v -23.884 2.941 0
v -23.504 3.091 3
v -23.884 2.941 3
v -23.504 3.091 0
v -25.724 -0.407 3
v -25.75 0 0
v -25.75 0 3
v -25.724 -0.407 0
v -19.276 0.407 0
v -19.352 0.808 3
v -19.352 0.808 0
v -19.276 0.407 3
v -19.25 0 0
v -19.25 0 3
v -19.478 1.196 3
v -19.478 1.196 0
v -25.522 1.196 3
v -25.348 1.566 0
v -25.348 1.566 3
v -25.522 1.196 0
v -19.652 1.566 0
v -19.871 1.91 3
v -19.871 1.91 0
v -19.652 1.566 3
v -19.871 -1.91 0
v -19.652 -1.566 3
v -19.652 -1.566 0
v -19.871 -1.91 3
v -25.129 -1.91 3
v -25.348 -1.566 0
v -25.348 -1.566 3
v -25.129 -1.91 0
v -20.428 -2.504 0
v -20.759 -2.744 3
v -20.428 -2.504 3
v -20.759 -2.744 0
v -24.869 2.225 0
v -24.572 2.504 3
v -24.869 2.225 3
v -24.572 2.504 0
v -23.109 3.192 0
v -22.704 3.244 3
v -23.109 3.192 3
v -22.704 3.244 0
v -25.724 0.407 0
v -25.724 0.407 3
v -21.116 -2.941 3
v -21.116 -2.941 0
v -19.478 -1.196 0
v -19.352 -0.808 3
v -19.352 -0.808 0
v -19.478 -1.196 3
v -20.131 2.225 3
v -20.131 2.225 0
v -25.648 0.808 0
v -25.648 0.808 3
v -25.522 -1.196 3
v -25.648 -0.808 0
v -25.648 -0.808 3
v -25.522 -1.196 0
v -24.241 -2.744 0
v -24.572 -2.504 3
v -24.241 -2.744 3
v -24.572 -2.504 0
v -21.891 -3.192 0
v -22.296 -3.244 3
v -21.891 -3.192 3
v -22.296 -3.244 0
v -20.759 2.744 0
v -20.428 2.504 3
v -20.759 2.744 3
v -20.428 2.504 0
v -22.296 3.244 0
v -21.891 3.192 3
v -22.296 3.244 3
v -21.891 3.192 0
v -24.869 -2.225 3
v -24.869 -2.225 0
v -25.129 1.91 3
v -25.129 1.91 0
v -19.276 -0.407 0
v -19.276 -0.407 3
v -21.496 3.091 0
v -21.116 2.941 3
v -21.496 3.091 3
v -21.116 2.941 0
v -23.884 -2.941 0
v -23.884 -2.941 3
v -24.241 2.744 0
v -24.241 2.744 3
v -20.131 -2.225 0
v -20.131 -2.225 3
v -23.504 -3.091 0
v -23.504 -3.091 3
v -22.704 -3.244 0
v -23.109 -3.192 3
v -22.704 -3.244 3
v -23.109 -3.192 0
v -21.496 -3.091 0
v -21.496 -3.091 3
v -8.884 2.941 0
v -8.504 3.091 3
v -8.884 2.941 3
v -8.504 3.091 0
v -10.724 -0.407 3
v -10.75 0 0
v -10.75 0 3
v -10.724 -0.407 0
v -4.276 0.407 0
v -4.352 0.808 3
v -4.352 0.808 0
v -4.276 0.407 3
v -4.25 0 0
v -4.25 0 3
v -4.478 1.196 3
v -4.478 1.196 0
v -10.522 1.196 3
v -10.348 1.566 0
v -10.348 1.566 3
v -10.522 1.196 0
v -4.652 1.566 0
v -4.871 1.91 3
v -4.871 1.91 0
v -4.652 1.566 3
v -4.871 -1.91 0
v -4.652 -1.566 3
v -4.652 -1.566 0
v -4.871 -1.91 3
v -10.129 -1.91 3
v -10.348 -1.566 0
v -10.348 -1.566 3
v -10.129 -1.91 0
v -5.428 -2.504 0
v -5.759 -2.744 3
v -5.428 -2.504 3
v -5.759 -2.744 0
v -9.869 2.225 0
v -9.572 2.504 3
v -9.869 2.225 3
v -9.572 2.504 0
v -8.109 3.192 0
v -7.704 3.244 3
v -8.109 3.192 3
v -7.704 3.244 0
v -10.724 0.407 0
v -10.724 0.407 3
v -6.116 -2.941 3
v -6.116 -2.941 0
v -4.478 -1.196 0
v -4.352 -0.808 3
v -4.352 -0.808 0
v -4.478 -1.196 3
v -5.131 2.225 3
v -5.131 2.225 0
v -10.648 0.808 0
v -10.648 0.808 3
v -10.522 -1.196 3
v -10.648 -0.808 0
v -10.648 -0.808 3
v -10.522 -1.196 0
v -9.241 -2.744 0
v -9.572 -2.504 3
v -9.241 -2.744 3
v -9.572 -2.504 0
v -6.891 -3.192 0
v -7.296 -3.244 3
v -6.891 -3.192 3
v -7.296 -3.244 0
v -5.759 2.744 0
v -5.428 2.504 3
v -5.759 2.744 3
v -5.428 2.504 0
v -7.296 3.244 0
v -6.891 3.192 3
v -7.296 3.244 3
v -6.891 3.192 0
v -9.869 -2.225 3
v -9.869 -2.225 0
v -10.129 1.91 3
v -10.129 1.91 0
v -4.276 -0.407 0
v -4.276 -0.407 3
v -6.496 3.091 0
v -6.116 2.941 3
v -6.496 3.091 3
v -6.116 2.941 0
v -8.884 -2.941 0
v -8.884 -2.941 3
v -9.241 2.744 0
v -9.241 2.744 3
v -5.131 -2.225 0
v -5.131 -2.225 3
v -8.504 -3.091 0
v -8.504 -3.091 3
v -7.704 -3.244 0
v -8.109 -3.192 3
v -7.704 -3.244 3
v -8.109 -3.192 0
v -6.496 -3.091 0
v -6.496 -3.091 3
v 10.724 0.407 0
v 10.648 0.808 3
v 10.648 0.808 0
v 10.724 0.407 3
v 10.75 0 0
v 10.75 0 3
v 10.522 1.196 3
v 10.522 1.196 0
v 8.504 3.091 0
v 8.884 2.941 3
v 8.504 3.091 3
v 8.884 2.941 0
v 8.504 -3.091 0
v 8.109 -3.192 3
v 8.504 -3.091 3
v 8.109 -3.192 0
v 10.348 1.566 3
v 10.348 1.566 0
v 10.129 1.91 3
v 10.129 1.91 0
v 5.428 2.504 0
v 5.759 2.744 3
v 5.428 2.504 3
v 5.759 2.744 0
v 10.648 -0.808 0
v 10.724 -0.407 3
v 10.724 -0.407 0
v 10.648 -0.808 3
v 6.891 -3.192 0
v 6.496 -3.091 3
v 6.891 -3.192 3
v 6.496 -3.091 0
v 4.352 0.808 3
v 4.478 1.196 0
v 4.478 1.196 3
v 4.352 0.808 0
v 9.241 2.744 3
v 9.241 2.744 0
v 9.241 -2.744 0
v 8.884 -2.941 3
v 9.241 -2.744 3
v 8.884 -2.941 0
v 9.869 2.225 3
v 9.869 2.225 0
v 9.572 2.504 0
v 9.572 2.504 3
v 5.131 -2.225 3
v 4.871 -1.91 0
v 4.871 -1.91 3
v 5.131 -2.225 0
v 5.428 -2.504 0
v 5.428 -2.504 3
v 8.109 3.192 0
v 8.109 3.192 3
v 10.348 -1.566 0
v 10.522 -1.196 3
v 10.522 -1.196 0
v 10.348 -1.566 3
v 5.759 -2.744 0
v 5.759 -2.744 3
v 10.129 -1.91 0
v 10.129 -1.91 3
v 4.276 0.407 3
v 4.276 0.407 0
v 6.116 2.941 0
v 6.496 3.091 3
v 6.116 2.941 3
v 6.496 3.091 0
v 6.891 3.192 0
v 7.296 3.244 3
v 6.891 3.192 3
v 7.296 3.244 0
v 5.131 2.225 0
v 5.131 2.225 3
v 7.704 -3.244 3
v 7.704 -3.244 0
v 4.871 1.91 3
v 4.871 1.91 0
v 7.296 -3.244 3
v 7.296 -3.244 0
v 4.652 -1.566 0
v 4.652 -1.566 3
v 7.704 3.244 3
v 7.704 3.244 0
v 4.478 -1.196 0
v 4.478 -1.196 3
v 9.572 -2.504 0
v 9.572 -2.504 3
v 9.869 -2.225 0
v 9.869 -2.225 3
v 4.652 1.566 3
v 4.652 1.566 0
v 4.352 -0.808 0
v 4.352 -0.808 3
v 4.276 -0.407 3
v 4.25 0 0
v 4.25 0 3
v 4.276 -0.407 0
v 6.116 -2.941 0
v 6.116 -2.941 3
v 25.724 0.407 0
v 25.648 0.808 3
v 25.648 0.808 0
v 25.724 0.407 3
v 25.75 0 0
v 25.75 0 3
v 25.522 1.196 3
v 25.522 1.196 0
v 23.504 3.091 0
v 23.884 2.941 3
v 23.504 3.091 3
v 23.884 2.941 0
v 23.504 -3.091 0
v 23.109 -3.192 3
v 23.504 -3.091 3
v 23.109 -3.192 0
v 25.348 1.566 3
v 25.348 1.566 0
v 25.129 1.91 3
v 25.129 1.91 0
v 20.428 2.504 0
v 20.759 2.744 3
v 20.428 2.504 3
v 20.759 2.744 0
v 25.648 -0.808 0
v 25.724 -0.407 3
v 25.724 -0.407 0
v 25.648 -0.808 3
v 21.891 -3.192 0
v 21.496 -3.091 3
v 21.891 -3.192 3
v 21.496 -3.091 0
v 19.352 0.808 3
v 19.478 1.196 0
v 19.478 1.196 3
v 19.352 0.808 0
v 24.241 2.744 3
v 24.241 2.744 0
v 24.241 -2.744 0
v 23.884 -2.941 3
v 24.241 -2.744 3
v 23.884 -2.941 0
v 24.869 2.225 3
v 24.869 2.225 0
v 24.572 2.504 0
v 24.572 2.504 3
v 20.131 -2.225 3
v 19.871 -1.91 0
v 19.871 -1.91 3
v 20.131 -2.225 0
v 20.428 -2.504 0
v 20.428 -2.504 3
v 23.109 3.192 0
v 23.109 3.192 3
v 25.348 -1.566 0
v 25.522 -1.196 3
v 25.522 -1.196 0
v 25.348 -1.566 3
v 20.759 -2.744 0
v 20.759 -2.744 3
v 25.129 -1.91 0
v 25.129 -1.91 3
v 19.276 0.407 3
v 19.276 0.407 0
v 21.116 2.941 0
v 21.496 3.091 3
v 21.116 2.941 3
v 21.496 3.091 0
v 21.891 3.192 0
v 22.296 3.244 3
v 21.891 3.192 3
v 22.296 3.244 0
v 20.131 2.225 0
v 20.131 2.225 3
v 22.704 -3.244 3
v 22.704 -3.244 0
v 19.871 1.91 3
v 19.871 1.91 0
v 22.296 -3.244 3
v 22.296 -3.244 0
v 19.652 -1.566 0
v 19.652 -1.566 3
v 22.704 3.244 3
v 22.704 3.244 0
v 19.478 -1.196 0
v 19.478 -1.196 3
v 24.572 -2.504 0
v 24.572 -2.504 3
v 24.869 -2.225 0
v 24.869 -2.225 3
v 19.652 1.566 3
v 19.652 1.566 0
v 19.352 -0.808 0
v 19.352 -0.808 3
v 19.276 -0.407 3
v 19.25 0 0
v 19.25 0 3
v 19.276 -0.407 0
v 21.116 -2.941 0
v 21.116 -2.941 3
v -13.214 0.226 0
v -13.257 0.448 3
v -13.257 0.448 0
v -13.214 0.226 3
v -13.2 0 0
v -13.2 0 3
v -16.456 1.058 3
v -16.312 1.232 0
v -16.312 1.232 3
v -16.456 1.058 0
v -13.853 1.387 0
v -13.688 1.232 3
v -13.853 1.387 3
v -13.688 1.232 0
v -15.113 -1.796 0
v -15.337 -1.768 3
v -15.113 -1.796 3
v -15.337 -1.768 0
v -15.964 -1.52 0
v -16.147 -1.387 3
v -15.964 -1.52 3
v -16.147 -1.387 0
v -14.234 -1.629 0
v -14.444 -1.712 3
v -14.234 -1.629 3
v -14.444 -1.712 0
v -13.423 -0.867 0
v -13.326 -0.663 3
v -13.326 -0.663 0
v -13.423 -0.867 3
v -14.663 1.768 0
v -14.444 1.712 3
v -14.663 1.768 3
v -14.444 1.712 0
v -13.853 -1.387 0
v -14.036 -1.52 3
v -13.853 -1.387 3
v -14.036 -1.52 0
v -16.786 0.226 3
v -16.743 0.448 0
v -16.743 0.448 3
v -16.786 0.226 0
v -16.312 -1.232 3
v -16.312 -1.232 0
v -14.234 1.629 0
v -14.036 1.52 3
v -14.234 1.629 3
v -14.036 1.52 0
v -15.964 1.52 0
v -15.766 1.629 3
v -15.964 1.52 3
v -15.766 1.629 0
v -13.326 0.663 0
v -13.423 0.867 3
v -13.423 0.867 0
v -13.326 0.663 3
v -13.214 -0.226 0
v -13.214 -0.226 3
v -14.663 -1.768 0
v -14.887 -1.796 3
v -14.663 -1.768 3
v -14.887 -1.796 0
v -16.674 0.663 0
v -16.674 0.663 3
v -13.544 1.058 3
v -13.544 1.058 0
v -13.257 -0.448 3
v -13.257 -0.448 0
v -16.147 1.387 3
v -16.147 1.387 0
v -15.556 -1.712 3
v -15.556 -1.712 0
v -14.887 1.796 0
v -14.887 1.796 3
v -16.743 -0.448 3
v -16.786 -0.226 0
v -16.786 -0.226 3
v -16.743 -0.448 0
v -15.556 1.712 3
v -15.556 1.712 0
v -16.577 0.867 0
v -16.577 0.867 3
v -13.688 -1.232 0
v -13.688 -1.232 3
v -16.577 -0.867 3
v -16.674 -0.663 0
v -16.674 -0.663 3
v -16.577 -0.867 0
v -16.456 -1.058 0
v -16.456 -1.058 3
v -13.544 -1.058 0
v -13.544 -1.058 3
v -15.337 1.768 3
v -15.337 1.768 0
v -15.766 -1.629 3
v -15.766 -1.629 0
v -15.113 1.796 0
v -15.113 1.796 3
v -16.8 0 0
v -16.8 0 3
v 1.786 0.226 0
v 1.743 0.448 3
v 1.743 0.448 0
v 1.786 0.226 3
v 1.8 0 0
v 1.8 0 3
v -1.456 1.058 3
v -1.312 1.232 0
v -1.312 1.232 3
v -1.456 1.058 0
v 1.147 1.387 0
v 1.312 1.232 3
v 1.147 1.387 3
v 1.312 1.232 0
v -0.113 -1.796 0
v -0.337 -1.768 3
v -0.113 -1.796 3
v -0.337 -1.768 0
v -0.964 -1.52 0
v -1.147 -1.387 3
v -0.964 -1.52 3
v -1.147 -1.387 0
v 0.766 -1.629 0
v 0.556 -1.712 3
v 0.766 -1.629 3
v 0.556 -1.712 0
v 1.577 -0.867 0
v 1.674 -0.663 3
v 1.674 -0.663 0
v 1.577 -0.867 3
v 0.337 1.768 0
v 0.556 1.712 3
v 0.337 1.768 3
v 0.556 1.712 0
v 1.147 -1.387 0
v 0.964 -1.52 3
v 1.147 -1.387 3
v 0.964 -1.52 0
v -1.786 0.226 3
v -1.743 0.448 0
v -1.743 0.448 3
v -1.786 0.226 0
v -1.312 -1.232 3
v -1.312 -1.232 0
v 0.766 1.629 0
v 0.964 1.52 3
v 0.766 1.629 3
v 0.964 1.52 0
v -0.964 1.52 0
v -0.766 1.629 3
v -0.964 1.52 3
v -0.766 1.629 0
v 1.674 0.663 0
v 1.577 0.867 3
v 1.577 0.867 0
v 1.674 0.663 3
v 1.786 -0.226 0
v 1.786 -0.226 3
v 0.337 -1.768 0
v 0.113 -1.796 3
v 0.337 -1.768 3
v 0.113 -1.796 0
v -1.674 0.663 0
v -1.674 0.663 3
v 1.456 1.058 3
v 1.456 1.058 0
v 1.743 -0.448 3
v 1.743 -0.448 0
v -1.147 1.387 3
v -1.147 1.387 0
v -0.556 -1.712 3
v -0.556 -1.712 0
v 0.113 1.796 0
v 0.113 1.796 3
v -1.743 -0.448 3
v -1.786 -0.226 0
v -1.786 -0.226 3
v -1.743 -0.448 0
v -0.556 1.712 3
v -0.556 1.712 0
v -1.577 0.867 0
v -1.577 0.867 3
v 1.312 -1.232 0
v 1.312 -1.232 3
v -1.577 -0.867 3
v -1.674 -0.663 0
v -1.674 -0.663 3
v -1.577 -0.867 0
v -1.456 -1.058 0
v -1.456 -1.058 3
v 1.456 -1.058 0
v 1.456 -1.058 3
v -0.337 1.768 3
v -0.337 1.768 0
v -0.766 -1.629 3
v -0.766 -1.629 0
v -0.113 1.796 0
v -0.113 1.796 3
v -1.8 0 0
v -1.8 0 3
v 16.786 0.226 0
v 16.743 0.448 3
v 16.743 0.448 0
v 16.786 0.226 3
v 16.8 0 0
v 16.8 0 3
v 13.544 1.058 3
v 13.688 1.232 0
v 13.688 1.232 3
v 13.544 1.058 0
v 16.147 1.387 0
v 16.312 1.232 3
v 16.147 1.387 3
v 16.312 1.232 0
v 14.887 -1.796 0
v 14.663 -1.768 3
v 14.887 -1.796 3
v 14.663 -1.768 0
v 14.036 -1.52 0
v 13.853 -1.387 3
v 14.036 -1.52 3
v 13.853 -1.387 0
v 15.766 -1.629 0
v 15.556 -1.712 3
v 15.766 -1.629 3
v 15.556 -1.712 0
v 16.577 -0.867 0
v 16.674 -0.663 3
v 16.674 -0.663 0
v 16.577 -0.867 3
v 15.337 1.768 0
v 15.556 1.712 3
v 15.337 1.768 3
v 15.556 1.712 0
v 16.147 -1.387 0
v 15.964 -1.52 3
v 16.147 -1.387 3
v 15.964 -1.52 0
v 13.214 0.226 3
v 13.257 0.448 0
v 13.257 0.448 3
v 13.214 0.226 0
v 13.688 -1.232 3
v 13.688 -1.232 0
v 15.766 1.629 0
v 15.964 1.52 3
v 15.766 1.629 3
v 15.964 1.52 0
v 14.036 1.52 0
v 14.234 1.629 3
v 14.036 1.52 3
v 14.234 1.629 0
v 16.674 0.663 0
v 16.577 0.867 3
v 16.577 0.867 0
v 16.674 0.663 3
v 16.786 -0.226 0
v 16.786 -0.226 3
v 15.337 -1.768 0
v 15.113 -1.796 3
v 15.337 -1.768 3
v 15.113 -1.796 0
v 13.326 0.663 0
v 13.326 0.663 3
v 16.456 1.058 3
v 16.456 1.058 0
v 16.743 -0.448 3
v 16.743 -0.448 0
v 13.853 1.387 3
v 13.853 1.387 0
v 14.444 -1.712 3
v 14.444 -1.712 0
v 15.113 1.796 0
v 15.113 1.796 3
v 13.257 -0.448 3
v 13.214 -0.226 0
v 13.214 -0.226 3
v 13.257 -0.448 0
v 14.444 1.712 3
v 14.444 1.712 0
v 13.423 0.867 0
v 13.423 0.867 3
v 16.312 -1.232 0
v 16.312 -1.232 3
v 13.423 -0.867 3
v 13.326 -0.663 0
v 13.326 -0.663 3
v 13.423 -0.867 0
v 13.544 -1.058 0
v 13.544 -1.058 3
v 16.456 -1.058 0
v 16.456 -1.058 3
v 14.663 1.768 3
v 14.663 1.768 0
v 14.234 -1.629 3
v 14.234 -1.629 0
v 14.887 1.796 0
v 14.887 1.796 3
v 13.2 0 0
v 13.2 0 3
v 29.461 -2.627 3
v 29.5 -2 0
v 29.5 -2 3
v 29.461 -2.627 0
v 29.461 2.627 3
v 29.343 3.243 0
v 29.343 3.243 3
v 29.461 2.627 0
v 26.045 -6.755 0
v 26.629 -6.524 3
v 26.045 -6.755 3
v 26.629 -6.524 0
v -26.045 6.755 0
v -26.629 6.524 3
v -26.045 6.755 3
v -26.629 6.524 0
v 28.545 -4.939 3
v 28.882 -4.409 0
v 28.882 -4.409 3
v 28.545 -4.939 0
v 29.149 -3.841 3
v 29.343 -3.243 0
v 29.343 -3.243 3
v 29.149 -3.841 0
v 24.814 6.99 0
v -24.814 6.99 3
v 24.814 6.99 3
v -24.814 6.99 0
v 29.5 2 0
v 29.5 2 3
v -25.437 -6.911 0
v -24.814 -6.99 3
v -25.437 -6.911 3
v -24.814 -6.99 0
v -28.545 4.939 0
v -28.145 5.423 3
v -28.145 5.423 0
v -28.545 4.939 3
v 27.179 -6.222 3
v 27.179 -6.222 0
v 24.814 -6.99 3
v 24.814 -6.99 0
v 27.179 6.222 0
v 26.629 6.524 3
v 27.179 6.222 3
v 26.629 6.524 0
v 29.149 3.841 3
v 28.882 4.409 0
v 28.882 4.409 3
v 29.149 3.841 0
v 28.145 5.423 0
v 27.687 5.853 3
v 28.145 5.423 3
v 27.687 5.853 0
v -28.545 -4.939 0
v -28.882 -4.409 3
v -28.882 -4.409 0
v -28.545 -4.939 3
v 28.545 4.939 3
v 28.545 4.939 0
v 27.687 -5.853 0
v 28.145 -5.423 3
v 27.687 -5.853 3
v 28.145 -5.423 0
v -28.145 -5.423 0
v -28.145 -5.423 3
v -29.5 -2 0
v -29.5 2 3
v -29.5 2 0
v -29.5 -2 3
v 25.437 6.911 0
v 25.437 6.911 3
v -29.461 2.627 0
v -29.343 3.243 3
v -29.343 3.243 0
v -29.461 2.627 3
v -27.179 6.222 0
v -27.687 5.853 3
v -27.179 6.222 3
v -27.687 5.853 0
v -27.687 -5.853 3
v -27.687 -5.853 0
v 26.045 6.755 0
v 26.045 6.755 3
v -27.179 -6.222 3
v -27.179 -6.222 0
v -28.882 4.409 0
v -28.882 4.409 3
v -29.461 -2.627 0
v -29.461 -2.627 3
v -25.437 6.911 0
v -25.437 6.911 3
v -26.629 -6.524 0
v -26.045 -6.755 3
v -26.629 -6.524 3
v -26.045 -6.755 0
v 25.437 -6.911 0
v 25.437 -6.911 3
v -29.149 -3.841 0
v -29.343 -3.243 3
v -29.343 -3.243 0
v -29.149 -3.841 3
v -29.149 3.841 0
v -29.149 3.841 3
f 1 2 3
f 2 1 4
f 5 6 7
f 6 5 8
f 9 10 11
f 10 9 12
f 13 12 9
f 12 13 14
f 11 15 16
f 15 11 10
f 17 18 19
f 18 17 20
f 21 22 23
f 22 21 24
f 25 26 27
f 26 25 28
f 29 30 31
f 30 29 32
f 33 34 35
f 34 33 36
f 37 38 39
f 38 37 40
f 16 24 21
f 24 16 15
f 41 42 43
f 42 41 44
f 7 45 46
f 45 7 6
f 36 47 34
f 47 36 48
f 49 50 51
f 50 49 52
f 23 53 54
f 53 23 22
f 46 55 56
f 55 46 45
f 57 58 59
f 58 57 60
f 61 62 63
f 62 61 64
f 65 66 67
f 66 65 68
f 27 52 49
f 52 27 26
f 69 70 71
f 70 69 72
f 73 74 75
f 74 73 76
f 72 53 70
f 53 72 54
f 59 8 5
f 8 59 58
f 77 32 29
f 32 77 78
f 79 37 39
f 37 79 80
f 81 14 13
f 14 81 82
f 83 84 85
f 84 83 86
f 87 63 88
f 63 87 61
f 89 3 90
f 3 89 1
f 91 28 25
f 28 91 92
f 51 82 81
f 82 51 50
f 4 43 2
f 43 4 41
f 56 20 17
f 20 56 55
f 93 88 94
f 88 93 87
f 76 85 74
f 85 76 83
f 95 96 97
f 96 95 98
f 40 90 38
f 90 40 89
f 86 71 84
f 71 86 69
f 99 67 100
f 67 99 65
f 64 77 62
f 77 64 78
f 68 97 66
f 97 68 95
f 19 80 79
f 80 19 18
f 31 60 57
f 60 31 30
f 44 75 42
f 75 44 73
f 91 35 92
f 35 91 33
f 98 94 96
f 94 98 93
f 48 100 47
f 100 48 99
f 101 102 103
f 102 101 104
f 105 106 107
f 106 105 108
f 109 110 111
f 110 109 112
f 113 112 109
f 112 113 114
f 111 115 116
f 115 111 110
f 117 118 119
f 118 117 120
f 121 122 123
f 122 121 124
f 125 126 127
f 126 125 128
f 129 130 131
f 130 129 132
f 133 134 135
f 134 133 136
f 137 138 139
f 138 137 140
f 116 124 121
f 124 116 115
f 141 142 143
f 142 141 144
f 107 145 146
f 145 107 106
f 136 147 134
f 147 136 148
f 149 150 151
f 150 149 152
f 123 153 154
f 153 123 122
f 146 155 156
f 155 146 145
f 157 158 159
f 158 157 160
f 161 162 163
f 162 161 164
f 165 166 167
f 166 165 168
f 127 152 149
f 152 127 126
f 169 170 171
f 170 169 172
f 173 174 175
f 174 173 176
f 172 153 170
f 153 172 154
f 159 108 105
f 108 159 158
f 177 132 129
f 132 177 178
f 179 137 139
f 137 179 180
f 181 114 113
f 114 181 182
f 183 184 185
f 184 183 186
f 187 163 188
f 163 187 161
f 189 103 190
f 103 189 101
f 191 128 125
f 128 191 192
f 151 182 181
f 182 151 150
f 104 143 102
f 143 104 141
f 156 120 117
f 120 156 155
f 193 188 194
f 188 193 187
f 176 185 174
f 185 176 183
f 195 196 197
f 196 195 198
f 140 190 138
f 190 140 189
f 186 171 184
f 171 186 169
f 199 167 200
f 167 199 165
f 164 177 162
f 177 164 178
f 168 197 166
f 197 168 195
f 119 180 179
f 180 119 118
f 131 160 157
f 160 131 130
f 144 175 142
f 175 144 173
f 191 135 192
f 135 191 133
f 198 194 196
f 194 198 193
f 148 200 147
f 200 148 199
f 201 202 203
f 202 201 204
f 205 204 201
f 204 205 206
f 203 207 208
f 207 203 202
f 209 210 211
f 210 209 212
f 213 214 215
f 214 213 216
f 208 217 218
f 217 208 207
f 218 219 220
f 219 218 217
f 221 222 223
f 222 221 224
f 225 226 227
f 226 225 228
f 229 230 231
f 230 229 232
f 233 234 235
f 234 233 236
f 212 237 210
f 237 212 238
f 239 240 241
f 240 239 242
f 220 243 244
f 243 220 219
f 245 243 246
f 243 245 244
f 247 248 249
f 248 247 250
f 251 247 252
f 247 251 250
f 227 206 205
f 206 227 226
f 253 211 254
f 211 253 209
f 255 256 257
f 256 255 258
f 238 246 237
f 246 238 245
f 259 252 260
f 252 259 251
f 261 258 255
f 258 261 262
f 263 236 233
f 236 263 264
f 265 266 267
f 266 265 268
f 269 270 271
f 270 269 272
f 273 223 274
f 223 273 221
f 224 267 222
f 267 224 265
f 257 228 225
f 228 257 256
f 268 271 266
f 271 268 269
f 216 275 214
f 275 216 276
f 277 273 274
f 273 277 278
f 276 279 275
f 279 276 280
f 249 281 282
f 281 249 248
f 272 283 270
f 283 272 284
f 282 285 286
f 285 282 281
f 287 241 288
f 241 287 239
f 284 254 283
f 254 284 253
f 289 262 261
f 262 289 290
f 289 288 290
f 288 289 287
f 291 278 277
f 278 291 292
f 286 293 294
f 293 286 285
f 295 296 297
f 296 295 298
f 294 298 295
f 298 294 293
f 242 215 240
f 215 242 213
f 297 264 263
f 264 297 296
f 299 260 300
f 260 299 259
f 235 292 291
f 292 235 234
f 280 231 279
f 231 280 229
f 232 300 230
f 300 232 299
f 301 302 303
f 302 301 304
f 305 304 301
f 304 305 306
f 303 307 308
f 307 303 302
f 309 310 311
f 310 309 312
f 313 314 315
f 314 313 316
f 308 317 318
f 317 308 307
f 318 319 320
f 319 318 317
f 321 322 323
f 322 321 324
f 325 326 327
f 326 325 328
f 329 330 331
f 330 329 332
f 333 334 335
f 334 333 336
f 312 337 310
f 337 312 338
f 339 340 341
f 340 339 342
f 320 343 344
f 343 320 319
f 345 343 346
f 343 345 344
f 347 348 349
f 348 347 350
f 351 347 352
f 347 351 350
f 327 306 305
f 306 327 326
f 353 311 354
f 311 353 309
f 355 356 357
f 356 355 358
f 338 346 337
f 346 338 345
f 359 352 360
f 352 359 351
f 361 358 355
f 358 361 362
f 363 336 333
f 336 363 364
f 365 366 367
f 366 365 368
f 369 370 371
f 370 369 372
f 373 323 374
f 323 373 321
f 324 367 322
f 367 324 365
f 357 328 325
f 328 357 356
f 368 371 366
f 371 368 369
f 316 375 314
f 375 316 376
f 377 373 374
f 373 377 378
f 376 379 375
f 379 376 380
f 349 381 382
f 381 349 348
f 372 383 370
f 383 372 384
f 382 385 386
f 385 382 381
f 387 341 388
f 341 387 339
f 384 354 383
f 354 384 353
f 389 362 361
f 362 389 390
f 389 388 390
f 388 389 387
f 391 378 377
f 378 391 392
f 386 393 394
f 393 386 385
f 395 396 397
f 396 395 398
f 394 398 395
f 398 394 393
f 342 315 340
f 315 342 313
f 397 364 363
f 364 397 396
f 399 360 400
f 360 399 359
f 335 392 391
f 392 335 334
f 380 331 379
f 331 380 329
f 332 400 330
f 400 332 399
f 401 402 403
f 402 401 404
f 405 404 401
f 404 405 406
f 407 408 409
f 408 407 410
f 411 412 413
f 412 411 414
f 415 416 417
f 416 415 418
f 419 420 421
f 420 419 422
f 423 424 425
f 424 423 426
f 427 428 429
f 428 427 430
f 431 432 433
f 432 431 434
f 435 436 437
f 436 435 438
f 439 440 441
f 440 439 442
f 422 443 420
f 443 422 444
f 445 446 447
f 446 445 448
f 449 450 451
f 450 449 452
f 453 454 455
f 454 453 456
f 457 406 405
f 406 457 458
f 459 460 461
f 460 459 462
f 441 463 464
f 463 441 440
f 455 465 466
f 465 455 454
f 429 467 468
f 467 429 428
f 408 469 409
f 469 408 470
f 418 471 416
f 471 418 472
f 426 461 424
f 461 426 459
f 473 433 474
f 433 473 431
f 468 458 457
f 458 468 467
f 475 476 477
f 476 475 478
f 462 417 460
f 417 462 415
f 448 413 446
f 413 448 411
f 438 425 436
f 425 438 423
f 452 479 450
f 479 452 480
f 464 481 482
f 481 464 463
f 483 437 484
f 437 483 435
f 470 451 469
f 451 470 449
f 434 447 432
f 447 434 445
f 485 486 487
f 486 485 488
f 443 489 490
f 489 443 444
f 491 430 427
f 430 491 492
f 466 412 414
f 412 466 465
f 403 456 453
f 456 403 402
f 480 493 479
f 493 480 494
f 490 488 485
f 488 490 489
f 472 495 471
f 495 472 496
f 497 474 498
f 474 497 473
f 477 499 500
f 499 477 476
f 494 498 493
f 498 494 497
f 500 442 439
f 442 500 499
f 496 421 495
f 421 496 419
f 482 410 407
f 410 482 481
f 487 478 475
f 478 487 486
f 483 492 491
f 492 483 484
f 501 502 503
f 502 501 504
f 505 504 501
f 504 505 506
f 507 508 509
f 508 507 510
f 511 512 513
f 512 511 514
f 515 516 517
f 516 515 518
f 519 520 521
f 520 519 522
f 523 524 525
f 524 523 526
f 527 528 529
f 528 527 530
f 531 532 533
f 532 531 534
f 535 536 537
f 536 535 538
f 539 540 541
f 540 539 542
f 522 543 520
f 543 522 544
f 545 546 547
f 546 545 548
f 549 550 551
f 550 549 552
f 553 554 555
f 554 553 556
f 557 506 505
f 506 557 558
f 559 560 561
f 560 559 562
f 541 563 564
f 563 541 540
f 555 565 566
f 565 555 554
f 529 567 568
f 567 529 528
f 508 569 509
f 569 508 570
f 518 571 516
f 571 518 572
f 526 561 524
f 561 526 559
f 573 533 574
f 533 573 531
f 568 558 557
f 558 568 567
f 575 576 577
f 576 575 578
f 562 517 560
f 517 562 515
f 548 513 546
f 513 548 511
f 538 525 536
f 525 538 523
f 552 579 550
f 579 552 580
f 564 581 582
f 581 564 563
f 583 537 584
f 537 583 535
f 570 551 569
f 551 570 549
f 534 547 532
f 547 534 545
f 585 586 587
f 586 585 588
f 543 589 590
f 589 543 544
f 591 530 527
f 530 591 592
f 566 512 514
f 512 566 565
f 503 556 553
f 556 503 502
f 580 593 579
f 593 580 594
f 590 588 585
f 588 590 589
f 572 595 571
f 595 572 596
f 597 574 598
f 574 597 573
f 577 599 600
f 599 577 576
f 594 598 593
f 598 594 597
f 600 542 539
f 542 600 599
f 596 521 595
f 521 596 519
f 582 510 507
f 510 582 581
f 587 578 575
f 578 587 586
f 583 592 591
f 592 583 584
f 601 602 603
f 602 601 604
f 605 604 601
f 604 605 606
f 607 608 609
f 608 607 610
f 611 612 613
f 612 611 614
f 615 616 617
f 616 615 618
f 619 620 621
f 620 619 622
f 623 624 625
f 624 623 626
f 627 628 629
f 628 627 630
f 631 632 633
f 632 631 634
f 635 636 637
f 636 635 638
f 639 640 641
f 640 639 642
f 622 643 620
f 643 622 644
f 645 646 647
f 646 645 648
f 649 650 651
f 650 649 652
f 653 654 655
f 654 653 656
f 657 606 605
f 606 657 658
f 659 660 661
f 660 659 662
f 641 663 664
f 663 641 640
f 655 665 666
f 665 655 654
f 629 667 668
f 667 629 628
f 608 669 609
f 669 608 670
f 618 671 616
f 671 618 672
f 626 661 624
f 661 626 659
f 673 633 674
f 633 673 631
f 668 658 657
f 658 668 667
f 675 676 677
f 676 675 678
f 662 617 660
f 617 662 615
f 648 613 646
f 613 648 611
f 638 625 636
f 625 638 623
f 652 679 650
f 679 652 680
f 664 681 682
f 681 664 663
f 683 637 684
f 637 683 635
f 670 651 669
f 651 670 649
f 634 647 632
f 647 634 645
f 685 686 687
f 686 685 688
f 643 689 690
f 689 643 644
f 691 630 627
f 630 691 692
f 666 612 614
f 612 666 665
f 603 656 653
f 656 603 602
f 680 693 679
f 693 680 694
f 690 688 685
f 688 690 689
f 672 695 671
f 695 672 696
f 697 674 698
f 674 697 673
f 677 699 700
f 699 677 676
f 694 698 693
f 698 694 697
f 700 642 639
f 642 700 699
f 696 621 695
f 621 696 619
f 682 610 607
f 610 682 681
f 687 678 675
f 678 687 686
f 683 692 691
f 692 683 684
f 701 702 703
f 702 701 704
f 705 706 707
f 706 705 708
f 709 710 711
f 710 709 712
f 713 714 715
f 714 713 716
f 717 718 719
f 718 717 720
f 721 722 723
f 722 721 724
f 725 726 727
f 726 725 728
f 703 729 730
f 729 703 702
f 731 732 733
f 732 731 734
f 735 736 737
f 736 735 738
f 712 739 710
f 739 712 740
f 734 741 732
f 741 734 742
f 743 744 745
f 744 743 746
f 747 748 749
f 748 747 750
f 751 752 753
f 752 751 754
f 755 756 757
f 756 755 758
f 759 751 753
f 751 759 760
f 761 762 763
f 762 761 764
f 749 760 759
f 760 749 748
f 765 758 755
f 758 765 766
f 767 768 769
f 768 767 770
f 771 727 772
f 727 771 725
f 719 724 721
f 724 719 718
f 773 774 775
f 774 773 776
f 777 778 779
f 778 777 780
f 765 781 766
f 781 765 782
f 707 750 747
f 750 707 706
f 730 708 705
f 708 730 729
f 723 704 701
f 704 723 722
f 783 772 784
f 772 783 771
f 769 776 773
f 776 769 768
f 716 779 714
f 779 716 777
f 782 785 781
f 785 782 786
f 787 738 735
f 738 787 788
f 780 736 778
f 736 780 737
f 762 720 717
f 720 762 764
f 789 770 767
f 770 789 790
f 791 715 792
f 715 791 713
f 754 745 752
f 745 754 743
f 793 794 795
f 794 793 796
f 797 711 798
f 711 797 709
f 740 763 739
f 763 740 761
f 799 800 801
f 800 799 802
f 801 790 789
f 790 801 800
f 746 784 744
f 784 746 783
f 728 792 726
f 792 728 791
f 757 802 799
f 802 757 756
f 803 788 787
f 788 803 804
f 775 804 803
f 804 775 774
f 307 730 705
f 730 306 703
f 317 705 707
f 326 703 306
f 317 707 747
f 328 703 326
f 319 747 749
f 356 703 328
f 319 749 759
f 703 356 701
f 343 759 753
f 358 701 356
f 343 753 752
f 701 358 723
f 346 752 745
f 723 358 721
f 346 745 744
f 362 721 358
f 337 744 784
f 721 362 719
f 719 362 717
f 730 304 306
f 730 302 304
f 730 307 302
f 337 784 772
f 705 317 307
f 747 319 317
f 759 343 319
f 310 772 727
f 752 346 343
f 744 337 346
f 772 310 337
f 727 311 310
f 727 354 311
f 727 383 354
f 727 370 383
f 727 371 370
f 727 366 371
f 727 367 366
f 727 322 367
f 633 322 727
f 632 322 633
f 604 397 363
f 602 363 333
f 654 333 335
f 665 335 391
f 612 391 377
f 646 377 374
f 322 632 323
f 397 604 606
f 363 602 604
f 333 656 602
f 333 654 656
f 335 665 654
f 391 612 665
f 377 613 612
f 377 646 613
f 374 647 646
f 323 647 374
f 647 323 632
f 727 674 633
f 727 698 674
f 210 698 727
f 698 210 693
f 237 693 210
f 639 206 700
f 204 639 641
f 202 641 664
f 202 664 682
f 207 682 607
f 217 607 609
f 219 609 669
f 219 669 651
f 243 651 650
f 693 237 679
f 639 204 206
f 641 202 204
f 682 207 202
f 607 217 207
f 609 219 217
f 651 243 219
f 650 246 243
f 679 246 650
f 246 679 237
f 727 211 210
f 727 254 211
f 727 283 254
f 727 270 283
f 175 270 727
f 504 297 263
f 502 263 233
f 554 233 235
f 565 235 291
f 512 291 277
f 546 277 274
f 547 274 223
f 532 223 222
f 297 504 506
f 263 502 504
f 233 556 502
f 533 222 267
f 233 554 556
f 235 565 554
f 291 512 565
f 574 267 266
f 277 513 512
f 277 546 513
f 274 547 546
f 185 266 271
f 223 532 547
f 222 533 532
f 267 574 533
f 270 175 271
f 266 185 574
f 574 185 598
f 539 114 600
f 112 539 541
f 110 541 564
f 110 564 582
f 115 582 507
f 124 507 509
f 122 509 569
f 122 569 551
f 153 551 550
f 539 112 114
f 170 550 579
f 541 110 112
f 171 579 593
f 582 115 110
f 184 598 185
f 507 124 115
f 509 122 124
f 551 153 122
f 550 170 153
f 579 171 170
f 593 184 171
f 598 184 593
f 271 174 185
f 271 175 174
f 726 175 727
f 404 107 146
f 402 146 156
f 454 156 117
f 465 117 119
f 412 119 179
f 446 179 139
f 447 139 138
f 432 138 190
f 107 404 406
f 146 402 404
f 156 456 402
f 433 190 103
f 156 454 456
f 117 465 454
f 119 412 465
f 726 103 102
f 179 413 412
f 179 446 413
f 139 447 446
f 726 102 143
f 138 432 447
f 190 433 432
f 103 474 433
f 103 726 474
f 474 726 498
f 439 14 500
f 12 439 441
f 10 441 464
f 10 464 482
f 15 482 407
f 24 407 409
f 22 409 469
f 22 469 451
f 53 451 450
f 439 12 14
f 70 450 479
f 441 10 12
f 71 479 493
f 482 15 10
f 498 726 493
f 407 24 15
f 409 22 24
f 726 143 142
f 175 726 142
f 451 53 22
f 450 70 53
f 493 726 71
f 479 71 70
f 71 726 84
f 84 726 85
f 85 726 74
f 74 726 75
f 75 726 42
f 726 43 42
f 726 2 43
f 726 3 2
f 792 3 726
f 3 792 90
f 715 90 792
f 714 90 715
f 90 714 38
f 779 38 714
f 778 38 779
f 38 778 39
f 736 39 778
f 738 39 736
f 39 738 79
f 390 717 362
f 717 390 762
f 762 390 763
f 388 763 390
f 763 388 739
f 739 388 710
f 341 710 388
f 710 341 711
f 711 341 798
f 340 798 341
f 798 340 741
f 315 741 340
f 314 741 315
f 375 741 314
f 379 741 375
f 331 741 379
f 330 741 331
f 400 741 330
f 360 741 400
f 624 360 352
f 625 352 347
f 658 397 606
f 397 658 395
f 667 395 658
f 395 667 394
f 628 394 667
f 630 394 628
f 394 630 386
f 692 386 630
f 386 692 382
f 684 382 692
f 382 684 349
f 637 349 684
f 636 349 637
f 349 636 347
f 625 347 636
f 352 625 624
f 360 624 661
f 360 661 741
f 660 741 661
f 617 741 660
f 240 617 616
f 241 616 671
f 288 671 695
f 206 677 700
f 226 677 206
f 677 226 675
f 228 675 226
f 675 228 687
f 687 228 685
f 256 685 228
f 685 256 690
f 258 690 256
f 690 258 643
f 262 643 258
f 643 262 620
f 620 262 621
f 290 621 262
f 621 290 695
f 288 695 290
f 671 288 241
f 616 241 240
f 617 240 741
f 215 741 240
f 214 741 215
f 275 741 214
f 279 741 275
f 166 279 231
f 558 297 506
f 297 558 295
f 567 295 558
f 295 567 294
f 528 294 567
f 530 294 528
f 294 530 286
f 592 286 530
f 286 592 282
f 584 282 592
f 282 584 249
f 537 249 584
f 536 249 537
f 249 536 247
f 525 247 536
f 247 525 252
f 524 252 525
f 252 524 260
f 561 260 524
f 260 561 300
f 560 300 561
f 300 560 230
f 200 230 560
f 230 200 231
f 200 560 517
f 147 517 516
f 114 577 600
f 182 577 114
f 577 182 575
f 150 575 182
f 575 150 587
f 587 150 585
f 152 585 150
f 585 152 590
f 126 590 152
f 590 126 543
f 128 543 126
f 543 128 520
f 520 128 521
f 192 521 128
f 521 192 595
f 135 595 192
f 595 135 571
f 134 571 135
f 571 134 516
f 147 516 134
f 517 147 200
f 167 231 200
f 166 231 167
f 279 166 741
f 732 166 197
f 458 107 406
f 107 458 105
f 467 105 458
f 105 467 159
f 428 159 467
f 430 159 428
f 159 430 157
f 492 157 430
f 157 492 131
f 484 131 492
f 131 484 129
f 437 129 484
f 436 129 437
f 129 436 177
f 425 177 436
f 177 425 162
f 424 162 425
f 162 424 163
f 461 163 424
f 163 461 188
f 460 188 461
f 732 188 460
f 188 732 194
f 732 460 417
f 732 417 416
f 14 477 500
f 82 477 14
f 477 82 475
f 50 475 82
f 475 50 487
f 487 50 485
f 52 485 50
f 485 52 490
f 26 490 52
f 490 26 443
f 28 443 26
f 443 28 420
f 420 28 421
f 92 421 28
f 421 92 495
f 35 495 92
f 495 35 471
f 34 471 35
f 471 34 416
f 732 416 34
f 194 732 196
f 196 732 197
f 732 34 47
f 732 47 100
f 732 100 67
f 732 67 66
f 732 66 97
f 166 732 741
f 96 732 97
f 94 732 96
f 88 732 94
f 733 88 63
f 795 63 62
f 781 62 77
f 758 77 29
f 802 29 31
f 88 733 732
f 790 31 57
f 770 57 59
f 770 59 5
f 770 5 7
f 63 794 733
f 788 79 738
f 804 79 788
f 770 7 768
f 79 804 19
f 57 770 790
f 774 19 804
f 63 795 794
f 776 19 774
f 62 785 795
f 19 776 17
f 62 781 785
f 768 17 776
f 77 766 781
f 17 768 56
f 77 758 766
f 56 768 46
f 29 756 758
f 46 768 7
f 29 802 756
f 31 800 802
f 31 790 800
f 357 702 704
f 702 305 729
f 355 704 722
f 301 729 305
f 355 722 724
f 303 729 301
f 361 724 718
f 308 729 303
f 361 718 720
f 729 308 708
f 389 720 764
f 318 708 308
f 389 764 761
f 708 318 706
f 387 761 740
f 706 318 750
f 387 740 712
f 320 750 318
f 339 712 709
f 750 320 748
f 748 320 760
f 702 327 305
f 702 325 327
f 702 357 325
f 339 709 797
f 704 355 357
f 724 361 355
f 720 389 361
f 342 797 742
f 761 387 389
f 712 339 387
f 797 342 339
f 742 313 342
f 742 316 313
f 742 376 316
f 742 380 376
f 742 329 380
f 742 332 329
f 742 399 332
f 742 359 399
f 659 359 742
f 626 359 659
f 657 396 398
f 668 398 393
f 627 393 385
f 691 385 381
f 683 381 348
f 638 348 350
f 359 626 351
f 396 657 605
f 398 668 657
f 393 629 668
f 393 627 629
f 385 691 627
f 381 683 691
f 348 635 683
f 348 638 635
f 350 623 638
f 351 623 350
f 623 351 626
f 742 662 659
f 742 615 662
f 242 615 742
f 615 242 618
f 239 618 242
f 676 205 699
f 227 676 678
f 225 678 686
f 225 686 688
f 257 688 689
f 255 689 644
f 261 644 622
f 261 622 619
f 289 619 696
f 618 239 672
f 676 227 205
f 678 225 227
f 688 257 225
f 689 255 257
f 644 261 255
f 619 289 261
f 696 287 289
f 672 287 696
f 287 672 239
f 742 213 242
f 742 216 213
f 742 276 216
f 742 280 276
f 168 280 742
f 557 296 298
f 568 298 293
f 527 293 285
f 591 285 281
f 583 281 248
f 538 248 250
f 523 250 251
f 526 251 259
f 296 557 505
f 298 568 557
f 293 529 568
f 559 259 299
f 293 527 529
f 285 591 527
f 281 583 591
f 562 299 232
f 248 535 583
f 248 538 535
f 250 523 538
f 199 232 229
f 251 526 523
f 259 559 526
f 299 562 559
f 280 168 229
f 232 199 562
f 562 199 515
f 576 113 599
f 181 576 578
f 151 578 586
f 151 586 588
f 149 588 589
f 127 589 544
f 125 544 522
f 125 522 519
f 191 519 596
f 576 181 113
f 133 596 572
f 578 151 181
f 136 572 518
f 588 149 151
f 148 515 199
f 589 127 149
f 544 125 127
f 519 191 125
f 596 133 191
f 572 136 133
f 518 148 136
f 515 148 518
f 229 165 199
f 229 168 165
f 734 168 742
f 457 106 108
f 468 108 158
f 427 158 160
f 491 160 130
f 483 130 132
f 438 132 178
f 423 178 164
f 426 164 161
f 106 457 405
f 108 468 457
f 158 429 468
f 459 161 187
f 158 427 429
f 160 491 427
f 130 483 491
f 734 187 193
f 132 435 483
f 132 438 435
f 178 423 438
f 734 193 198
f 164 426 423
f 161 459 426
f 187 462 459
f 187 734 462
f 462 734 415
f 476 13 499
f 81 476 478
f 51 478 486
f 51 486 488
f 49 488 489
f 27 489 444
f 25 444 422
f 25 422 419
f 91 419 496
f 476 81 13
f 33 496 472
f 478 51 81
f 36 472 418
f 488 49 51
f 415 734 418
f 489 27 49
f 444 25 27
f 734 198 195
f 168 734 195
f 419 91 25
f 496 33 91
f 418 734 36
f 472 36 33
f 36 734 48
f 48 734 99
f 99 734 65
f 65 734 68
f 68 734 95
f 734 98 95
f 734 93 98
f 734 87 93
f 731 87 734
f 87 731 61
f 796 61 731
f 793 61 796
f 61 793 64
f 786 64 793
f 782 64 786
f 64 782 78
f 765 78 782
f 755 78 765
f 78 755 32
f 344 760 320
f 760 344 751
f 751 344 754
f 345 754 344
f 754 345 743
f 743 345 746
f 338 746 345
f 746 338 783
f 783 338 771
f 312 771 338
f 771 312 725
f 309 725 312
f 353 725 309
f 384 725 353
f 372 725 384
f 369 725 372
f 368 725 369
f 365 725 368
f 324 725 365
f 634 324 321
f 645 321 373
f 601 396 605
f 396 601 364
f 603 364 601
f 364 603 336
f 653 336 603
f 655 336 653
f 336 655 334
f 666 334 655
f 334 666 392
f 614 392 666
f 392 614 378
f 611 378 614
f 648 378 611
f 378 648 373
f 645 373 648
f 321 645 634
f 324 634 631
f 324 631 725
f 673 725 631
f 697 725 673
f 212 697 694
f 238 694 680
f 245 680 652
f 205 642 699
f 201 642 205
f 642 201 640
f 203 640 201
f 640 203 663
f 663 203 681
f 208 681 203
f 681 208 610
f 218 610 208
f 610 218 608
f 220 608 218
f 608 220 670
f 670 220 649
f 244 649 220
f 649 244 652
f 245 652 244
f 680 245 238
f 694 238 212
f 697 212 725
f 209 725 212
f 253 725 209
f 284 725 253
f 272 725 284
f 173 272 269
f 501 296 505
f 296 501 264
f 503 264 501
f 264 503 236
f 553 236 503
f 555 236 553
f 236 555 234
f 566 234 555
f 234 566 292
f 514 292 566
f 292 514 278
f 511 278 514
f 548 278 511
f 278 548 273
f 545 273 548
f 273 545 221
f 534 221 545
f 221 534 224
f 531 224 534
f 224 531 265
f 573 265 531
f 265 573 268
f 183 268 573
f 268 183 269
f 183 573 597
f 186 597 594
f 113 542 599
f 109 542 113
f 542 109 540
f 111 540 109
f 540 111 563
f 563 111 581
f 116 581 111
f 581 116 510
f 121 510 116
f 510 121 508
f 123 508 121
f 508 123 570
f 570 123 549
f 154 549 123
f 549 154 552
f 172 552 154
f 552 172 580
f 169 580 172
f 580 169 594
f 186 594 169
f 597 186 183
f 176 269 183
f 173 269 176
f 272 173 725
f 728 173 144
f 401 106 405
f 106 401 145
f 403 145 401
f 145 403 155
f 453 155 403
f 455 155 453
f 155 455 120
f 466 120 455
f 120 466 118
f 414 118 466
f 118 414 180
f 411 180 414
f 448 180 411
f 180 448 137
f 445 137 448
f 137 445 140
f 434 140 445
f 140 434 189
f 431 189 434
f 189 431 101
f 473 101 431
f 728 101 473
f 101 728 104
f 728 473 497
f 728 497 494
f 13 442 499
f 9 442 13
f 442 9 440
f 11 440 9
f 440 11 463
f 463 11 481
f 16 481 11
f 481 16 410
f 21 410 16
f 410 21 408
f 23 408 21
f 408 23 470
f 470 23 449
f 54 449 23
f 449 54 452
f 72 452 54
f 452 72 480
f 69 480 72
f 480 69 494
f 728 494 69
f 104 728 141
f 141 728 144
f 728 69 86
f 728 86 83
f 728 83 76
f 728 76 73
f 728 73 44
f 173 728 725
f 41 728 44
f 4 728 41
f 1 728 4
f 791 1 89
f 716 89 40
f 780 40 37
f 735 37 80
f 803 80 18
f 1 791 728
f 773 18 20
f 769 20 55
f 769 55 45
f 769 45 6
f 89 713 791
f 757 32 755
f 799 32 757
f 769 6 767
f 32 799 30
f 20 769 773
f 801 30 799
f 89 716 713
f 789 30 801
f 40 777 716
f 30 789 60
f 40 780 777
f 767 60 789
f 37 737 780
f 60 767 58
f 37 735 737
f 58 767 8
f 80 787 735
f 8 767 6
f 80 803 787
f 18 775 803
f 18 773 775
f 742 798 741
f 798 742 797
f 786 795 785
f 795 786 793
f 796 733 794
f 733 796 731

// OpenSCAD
$fn = 50;

difference() {
	union() {
		hull() {
			translate(v = [-24.5, 2.0, 0]) {
				cylinder(h = 3, r = 5);
			}
			translate(v = [24.5, 2.0, 0]) {
				cylinder(h = 3, r = 5);
			}
			translate(v = [-24.5, -2.0, 0]) {
				cylinder(h = 3, r = 5);
			}
			translate(v = [24.5, -2.0, 0]) {
				cylinder(h = 3, r = 5);
			}
		}
	}
	union() {
		translate(v = [-22.5, 0.0, 0]) {
			translate(v = [0, 0, -100]) {
				cylinder(h = 200, r = 3.25);
			}
		}
		translate(v = [-7.5, 0.0, 0]) {
			translate(v = [0, 0, -100]) {
				cylinder(h = 200, r = 3.25);
			}
		}
		translate(v = [7.5, 0.0, 0]) {
			translate(v = [0, 0, -100]) {
				cylinder(h = 200, r = 3.25);
			}
		}
		translate(v = [22.5, 0.0, 0]) {
			translate(v = [0, 0, -100]) {
				cylinder(h = 200, r = 3.25);
			}
		}
		translate(v = [-22.5, 0.0, 0]) {
			translate(v = [0, 0, -100]) {
				cylinder(h = 200, r = 1.8);
			}
		}
		translate(v = [-15.0, 0.0, 0]) {
			translate(v = [0, 0, -100]) {
				cylinder(h = 200, r = 1.8);
			}
		}
		translate(v = [-7.5, 0.0, 0]) {
			translate(v = [0, 0, -100]) {
				cylinder(h = 200, r = 1.8);
			}
		}
		translate(v = [0, 0, -100]) {
			cylinder(h = 200, r = 1.8);
		}
		translate(v = [7.5, 0.0, 0]) {
			translate(v = [0, 0, -100]) {
				cylinder(h = 200, r = 1.8);
			}
		}
		translate(v = [15.0, 0.0, 0]) {
			translate(v = [0, 0, -100]) {
				cylinder(h = 200, r = 1.8);
			}
		}
		translate(v = [22.5, 0.0, 0]) {
			translate(v = [0, 0, -100]) {
				cylinder(h = 200, r = 1.8);
			}
		}
	}
}
